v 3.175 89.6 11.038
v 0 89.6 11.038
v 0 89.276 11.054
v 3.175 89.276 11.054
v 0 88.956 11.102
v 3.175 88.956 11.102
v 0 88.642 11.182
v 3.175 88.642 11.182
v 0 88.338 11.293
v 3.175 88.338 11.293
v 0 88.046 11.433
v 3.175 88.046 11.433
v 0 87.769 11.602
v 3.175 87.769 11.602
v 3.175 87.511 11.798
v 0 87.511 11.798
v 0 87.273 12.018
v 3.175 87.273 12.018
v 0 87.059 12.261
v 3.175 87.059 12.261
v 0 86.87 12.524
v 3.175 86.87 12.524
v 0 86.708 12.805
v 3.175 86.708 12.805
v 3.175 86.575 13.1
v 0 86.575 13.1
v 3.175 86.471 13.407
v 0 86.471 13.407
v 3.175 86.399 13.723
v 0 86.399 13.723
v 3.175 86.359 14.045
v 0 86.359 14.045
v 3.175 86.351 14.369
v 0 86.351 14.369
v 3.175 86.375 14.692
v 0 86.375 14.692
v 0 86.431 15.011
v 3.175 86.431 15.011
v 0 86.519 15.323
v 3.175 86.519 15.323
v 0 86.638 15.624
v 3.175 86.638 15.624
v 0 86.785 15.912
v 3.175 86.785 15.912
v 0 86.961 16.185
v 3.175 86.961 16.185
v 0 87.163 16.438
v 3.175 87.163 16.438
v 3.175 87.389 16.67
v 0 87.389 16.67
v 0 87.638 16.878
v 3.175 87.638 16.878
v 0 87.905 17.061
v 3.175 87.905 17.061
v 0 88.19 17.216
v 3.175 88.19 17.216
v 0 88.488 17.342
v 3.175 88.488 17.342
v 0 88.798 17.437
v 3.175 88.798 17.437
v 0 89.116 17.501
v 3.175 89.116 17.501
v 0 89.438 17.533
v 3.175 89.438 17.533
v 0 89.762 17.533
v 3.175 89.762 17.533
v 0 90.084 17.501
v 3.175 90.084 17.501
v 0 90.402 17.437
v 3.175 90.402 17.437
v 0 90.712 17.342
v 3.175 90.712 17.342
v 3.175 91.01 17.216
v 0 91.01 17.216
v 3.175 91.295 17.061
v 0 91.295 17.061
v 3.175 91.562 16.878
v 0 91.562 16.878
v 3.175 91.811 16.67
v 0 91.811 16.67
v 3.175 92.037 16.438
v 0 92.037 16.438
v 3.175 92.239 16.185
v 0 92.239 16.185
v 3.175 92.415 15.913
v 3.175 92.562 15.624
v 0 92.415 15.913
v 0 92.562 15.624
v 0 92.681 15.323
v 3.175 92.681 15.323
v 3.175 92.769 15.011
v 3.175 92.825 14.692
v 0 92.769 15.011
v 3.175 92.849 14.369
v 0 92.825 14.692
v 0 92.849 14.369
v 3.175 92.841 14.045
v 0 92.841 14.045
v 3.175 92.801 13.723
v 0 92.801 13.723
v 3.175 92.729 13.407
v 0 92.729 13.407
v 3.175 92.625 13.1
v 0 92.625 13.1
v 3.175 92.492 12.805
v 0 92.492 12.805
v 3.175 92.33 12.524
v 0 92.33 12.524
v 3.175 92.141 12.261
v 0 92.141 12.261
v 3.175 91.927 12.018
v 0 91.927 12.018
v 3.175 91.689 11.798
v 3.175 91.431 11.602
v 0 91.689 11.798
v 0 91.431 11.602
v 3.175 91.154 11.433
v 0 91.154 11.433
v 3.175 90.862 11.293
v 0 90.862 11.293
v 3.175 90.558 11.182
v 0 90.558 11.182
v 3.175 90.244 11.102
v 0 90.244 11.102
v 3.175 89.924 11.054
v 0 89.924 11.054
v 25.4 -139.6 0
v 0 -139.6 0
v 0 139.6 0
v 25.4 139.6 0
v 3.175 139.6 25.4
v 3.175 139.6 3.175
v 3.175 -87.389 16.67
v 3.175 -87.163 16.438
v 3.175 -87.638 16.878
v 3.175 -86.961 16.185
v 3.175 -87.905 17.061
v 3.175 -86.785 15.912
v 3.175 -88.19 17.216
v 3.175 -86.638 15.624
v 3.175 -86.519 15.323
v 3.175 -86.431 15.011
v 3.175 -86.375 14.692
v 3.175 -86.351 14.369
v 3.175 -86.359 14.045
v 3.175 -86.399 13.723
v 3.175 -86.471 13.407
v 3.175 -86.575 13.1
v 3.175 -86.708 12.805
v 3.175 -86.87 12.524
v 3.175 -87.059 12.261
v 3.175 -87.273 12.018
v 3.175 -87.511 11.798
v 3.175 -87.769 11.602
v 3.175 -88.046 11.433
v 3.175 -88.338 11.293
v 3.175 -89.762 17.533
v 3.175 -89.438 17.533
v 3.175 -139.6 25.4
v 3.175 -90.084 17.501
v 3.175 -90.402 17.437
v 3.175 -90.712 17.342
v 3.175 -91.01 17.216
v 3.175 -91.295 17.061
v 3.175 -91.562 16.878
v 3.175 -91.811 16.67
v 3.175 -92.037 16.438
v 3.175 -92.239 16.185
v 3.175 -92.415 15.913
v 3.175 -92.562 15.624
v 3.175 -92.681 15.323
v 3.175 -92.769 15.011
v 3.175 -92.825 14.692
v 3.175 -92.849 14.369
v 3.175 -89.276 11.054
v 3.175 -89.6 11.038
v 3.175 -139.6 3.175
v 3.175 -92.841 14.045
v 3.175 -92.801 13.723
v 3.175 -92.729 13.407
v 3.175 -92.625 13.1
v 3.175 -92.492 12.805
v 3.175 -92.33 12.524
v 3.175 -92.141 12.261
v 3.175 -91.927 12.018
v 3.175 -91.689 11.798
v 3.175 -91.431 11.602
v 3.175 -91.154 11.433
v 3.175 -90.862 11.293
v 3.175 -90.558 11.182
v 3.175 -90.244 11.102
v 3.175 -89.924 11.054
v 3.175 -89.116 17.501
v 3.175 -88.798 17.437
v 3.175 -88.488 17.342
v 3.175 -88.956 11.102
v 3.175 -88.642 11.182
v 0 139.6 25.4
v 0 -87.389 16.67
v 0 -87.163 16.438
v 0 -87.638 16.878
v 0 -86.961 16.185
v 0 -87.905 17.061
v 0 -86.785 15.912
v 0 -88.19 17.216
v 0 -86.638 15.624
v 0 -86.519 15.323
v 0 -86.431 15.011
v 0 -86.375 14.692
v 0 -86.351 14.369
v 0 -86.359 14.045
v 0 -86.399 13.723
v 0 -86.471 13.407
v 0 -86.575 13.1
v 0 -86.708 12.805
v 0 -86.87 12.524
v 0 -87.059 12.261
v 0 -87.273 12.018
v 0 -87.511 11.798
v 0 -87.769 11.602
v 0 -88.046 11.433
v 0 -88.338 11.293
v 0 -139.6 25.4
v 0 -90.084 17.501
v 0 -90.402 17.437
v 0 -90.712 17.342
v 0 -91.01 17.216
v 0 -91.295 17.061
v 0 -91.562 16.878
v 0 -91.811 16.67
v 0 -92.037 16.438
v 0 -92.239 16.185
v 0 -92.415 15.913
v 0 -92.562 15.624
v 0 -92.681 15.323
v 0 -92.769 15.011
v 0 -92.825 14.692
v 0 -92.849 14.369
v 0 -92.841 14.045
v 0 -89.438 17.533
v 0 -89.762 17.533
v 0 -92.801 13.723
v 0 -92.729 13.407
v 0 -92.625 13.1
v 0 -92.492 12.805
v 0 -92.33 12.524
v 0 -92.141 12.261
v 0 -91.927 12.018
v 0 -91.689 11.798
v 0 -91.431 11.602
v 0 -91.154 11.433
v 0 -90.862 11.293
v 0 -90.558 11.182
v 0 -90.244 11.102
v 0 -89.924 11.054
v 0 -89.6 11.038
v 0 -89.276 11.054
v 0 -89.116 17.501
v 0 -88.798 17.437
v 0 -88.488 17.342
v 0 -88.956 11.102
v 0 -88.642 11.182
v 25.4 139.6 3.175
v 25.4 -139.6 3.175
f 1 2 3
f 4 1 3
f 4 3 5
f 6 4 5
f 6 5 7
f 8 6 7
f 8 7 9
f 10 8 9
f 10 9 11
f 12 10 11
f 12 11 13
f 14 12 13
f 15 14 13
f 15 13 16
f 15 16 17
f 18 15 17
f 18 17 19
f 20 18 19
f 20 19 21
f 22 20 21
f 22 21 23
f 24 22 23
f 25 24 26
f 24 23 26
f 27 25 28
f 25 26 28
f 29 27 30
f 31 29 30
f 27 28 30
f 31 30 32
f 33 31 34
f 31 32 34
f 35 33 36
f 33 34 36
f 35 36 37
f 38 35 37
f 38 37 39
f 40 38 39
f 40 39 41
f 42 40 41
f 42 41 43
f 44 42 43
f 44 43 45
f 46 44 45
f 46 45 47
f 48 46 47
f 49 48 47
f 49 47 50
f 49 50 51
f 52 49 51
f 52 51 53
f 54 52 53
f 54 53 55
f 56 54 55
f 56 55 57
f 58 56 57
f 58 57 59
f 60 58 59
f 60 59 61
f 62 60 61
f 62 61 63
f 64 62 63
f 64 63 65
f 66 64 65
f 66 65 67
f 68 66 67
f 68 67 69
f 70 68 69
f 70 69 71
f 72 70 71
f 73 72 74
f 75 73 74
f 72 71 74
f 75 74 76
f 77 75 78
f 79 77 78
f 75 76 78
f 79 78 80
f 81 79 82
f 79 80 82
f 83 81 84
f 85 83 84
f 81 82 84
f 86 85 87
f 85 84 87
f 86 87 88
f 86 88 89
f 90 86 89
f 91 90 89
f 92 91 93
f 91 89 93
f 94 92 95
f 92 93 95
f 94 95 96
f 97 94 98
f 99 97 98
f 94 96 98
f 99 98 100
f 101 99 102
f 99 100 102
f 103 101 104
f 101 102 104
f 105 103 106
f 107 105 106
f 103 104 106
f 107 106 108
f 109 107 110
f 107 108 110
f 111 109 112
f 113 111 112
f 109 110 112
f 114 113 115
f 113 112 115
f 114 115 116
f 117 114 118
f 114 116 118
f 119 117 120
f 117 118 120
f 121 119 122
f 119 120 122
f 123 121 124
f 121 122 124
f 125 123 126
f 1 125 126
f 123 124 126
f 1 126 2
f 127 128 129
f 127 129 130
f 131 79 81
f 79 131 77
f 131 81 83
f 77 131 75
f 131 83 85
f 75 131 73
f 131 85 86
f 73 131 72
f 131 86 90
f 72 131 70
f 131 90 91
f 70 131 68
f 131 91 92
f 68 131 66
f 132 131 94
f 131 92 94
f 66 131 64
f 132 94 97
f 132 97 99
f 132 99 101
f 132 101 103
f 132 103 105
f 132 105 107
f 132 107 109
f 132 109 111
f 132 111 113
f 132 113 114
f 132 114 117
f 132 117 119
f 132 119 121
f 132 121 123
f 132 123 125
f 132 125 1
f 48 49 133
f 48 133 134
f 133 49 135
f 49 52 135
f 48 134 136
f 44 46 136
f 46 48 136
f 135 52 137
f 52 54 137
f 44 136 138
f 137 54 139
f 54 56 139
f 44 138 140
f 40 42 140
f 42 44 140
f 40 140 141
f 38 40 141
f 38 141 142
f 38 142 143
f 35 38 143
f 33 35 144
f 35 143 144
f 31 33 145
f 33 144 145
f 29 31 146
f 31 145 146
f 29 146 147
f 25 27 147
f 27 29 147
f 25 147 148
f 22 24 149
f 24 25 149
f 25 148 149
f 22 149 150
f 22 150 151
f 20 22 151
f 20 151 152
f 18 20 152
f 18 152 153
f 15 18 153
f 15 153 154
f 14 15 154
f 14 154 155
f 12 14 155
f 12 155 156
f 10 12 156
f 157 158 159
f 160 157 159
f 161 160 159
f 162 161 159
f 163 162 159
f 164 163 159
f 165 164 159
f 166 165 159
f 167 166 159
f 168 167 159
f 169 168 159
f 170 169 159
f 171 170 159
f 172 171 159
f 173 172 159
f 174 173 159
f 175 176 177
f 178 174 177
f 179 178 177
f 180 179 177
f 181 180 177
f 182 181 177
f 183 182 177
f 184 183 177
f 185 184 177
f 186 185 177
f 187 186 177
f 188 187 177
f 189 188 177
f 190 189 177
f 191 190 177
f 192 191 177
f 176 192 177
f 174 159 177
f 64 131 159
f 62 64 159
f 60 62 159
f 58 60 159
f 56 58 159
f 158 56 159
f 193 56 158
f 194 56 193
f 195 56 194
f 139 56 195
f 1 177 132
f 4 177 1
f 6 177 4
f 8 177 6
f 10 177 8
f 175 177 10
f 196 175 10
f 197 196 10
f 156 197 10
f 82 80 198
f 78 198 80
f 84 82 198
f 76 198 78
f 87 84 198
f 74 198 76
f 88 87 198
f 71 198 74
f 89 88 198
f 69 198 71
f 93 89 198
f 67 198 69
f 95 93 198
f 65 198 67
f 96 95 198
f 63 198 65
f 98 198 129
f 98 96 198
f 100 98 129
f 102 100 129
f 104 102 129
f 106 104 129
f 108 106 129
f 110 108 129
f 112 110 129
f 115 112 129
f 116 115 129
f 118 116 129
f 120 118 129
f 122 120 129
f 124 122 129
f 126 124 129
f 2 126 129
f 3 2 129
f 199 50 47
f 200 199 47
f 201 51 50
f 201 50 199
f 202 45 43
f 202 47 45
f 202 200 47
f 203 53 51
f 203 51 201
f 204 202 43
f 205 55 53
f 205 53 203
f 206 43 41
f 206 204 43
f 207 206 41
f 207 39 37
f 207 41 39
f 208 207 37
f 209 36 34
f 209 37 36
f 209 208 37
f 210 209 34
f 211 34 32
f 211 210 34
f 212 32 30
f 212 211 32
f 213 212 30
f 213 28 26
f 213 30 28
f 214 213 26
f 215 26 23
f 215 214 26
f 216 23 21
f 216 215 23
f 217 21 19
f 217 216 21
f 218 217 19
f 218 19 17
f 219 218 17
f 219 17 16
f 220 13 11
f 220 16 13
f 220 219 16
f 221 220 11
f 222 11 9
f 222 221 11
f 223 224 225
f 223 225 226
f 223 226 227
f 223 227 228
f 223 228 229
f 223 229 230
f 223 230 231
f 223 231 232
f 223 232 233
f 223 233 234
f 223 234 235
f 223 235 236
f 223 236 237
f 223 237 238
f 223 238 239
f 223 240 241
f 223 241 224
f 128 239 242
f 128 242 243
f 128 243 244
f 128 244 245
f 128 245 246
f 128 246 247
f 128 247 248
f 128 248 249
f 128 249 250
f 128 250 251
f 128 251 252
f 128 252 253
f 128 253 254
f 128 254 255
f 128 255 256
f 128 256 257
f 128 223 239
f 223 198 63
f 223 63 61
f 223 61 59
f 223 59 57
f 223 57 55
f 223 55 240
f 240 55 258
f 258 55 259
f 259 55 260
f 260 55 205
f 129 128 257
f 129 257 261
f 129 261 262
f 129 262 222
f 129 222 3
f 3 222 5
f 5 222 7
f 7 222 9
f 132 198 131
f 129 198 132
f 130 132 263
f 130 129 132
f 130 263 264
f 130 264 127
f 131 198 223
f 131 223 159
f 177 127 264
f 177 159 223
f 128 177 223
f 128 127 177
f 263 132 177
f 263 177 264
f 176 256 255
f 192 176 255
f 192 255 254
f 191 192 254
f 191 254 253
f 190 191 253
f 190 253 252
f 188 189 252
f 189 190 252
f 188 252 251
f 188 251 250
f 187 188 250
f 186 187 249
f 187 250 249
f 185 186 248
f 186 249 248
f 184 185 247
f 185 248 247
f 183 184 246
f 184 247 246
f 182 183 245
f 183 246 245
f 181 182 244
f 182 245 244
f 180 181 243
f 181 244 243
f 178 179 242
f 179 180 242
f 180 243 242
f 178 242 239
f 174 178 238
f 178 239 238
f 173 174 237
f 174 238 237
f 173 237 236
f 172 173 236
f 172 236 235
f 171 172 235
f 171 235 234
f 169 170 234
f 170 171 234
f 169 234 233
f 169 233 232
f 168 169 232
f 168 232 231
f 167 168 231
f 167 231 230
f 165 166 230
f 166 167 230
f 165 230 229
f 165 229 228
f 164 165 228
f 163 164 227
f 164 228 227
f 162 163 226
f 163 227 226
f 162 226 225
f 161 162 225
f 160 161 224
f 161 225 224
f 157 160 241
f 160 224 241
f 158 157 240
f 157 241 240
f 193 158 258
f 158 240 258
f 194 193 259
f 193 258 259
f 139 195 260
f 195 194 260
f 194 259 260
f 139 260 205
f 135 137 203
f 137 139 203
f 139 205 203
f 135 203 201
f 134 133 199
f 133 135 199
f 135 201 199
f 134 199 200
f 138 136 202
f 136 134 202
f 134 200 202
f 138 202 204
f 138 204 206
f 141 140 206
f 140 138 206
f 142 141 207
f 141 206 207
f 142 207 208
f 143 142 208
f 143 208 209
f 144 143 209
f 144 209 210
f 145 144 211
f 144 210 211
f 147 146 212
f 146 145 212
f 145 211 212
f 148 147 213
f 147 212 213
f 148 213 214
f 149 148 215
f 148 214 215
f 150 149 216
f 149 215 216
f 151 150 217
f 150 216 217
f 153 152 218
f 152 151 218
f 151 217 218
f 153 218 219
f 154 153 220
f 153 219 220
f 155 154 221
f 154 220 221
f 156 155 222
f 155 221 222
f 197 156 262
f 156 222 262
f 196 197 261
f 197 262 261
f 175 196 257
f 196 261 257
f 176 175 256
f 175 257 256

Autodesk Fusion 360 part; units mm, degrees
sketch "Sketch1" plane through (0, 0, 0) normal (0, 1, 0) x (1, 0, 0)
  line L0 (0, -25.4) -> (0, 0)
  line L1 (0, 0) -> (25.4, 0)
  line L2 (12.7, -12.7) -> (11.05, -11.05) construction
  line L3 (3.175, -25.4) -> (3.175, -3.175)
  line L4 (3.175, -3.175) -> (25.4, -3.175)
  line L5 (25.4, -3.175) -> (25.4, 0)
  line L6 (0, -25.4) -> (3.175, -25.4)
  dimension "d1" = 25.4
  dimension "d2" = 25.4
  dimension "d13" = 3.175
extrude "Extrude1" add sketch "Sketch1" along normal blind 139.6
hole "Hole3" at (3.175, 89.6, 14.2875) direction (-1, 0, 0) diameter 6.5 end through all
mirror "Mirror1" about plane through (0, 0, 0) normal (0, 1, 0) of bodies 1 merged
equation "d5 = ( 279.2 / 2 ) * 1 mm"
equation "d27 = ( 22.225 / 2 ) * 1 mm"
